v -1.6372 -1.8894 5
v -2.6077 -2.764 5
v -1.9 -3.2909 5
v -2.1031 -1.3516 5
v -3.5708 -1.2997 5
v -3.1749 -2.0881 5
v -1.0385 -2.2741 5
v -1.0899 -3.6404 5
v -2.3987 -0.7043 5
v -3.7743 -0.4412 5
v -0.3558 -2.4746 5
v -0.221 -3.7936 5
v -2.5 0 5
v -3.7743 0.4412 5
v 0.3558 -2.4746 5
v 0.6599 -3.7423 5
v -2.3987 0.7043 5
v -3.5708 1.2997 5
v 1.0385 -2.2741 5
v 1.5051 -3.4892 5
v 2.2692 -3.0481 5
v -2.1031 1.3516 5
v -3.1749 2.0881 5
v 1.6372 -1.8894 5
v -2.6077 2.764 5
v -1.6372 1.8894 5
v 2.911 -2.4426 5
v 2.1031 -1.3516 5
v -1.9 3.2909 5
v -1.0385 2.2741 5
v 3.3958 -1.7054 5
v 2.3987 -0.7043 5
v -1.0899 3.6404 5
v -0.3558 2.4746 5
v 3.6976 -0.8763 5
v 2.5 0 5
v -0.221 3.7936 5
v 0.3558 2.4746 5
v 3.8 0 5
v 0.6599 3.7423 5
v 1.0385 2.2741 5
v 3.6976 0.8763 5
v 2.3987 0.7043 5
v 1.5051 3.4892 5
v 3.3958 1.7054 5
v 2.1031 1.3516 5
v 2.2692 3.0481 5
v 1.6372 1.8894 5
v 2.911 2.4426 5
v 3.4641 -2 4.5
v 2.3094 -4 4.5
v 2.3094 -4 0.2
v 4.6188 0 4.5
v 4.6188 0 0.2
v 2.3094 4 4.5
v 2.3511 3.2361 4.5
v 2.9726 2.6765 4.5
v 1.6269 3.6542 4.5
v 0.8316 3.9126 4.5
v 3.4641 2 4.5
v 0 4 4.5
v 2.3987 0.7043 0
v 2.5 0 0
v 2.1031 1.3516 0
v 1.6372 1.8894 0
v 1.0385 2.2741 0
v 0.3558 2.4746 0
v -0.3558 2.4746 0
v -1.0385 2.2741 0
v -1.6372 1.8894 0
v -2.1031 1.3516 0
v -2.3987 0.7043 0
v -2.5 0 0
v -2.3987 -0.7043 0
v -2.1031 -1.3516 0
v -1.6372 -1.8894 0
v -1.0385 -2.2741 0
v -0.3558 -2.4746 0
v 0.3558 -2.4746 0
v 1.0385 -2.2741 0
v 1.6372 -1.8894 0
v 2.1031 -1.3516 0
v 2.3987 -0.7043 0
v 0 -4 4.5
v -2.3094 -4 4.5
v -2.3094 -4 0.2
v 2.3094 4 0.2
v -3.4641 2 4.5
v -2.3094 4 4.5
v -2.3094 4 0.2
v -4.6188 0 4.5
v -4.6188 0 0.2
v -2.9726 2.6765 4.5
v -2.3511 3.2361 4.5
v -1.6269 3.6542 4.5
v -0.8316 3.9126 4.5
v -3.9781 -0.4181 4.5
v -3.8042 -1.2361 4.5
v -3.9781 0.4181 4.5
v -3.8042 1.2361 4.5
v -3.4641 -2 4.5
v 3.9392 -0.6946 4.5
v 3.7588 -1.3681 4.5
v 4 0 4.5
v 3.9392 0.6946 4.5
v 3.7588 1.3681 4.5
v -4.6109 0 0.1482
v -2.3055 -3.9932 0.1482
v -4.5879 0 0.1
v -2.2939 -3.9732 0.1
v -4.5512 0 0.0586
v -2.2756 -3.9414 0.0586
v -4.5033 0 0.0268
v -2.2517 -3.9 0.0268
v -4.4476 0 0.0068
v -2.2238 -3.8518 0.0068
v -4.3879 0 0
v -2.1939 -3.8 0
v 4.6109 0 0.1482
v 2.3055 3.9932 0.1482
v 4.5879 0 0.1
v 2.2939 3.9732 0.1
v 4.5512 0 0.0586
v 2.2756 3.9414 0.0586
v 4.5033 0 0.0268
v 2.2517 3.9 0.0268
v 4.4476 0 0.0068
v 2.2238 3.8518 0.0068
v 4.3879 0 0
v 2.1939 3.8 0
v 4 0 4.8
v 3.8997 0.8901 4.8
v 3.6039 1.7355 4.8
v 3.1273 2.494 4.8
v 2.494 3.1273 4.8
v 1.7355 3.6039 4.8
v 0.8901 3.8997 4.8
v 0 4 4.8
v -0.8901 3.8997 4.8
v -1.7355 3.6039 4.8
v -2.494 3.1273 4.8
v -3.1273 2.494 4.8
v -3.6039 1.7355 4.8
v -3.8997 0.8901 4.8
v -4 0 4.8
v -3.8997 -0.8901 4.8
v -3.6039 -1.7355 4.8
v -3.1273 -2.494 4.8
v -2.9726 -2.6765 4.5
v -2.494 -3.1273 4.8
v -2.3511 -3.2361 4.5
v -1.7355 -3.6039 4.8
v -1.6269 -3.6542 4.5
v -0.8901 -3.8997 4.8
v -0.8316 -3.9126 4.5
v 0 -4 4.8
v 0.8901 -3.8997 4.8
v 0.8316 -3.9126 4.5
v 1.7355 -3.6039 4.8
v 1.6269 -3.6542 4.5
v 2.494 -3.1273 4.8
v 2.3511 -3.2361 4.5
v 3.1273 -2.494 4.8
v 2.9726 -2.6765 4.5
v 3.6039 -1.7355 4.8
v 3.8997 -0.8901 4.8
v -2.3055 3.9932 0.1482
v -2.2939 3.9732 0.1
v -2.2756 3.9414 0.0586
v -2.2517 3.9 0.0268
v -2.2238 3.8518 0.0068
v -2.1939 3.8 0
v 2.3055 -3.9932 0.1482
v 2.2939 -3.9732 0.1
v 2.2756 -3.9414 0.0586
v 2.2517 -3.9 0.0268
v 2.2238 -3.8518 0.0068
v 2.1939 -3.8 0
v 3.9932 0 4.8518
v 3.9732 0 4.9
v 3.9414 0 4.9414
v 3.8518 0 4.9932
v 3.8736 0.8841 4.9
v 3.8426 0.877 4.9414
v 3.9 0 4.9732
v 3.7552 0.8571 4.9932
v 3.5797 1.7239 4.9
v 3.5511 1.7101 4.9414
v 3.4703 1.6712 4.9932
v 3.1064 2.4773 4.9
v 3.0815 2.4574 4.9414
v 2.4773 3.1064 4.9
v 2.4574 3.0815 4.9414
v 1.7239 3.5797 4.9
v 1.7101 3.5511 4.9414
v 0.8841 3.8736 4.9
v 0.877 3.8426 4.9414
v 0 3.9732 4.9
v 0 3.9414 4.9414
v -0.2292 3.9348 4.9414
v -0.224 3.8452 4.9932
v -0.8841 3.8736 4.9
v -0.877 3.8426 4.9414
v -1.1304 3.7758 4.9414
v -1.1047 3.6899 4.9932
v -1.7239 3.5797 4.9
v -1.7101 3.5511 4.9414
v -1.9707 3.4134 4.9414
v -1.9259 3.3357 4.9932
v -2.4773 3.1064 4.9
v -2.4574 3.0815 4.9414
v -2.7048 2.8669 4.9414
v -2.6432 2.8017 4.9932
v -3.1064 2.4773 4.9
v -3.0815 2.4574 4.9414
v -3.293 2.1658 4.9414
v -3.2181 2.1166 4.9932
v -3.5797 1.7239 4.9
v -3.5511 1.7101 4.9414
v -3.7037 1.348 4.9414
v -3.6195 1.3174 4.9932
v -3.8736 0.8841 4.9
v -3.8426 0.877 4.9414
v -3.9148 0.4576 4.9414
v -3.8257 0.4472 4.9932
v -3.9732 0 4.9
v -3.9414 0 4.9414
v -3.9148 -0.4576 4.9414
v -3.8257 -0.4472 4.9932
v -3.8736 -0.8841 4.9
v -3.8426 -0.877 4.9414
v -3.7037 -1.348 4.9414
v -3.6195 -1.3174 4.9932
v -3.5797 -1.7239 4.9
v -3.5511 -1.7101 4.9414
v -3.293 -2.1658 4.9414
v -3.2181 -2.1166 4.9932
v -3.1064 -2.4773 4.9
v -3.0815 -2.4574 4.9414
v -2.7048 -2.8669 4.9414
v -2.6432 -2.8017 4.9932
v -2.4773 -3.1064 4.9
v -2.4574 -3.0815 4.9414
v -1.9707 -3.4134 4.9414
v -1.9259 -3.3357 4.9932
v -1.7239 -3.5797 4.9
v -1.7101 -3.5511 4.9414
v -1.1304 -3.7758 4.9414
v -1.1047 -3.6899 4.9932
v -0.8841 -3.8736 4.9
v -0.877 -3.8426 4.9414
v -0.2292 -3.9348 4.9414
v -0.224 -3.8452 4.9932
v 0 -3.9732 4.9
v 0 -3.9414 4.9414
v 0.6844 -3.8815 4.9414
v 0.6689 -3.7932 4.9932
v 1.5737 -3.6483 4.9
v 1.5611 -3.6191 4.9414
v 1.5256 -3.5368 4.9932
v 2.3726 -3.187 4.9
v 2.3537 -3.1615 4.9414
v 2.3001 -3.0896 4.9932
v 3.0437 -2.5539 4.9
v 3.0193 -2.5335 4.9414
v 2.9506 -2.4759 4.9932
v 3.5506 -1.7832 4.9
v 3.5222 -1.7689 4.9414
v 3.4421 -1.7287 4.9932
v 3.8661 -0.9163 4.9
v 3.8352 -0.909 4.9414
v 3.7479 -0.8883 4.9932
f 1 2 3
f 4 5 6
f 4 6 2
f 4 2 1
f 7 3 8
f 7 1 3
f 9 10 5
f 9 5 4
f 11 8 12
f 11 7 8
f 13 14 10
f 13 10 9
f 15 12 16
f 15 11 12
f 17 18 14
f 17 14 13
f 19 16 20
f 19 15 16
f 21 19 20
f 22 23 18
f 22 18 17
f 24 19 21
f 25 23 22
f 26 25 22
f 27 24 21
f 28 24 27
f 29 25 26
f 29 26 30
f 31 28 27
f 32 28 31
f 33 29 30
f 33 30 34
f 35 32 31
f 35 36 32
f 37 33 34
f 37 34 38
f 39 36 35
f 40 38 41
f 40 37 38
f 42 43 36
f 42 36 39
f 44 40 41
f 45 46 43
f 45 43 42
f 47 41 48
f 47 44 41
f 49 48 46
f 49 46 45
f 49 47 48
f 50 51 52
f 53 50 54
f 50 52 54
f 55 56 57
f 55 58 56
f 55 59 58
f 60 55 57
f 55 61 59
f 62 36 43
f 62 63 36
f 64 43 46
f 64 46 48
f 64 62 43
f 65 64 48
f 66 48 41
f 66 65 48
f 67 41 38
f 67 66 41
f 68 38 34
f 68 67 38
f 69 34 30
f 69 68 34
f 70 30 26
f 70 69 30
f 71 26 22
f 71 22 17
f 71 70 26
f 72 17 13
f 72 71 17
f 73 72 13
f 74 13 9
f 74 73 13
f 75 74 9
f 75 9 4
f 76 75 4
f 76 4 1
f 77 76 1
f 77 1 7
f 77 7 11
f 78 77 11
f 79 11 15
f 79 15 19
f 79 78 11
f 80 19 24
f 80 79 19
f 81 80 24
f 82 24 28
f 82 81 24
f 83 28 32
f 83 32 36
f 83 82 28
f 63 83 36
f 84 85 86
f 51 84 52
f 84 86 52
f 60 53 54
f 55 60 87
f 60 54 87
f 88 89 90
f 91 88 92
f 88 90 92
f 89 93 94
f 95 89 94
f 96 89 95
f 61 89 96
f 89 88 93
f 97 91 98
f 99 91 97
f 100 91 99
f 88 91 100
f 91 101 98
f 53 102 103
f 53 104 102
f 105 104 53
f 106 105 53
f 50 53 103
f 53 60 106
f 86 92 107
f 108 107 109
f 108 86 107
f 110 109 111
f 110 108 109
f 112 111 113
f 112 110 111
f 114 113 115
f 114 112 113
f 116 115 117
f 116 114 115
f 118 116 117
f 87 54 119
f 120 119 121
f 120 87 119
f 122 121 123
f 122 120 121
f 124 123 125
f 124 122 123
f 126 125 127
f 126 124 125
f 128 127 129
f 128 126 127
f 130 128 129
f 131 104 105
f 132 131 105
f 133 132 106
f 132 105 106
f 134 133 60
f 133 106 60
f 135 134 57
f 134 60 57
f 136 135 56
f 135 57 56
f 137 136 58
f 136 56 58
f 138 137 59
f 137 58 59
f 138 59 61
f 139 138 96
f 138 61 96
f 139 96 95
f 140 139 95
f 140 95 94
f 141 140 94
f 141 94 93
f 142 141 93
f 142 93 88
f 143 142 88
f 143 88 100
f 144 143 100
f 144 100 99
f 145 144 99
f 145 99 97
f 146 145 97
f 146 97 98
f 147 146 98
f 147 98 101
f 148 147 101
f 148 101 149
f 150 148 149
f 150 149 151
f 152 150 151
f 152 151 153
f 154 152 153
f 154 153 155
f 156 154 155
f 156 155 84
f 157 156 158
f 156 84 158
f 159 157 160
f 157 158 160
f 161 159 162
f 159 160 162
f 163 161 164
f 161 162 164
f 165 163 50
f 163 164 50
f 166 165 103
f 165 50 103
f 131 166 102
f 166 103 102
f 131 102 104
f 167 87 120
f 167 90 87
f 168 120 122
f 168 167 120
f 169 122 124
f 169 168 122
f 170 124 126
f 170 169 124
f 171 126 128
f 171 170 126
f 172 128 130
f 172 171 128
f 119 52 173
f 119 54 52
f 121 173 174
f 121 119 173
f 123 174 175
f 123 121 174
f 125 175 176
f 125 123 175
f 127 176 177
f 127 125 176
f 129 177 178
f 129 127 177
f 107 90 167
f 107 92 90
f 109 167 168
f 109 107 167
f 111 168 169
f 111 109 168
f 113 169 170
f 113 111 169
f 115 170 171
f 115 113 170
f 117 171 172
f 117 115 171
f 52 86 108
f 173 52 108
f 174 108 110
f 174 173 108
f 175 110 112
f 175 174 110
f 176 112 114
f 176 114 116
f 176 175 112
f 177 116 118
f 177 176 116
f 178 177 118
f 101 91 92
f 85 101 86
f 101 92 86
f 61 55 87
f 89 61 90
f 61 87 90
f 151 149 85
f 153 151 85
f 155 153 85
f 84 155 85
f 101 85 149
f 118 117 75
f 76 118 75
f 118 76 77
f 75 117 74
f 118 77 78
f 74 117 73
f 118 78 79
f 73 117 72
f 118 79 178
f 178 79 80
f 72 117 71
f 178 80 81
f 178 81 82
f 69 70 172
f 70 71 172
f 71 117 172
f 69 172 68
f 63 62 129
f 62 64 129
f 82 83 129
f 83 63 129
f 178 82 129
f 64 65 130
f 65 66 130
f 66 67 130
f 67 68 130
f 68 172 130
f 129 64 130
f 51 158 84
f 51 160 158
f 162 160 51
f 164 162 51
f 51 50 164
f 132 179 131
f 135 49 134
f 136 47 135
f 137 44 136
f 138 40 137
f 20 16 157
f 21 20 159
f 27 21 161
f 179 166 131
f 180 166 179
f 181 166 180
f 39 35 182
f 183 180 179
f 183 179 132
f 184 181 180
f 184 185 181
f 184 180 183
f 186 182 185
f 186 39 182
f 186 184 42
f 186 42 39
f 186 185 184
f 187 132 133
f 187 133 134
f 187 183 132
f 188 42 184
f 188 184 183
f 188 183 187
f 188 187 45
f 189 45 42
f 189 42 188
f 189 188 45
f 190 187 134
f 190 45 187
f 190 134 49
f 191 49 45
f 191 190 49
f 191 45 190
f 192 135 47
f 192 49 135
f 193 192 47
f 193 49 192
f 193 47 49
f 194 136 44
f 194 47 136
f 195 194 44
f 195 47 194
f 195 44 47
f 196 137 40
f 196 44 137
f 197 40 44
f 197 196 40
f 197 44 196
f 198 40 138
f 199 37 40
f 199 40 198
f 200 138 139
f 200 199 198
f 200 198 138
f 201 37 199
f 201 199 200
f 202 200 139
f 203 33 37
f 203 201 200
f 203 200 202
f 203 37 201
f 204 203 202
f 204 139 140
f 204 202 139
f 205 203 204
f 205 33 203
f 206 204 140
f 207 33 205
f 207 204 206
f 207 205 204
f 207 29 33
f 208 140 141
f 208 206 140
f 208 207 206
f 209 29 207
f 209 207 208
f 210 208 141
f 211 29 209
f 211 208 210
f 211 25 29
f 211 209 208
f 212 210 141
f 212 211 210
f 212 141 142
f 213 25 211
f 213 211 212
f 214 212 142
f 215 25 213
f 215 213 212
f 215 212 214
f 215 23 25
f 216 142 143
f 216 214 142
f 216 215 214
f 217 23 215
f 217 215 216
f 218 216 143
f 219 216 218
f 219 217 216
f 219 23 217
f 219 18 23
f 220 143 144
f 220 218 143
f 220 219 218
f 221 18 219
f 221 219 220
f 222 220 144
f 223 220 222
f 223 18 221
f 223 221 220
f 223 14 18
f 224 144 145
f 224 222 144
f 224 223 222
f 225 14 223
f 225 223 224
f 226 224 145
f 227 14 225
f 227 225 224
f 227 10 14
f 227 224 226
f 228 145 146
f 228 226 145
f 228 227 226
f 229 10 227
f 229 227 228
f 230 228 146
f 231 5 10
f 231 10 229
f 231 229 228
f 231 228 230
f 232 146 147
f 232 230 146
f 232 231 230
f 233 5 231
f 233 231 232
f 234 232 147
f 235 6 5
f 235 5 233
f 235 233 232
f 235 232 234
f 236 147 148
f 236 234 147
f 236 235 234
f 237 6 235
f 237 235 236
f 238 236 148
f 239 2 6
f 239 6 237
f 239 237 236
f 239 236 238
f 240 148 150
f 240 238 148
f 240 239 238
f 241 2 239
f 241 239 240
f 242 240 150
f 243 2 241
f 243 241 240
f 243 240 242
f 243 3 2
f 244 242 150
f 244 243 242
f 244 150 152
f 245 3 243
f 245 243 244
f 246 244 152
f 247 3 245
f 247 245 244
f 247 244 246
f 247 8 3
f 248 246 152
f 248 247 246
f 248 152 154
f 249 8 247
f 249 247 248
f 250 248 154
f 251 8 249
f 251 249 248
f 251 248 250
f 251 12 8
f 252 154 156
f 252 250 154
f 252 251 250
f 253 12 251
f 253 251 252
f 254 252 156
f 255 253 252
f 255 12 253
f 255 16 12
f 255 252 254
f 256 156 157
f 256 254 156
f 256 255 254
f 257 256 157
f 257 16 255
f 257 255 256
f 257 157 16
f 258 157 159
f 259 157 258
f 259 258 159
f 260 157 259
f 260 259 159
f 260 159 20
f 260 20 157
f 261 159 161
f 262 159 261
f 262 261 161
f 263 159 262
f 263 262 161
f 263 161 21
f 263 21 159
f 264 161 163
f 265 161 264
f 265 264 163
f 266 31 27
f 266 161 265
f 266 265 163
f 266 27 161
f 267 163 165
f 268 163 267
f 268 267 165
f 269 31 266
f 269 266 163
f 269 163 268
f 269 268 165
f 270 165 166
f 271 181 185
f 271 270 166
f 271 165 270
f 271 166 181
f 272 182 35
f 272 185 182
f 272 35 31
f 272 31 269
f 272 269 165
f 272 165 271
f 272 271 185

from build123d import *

# Parameters (mm, degrees)
SKETCH_1_R      = 2.5
EXTRUDE_1_DEPTH = 4.5
SKETCH_2_R      = 4
SKETCH_2_R_2    = 2.5
EXTRUDE_2_DEPTH = 0.5
FILLET_1_R      = 0.2
FILLET_2_R      = 0.2


with BuildPart() as part:
    # 草图1 → 凸台-拉伸1 (new body)
    with BuildSketch(Plane.XY):
        Polygon((4.618802154, 0), (2.309401077, 4), (-2.309401077, 4), (-4.618802154, 0), (-2.309401077, -4), (2.309401077, -4), align=None)
        Circle(SKETCH_1_R, mode=Mode.SUBTRACT)
    extrude(amount=EXTRUDE_1_DEPTH)

    # 草图2 → 凸台-拉伸2 (add)
    with BuildSketch(Plane.XY.offset(4.5)):
        Circle(SKETCH_2_R)
        Circle(SKETCH_2_R_2, mode=Mode.SUBTRACT)
    extrude(amount=EXTRUDE_2_DEPTH)

    # 圆角1
    fillet_1_edges = [part.edges().sort_by_distance(p)[0] for p in [
        (-4, 0, 5),
    ]]
    fillet(fillet_1_edges, radius=FILLET_1_R)

    # 圆角2
    fillet_2_edges = [part.edges().sort_by_distance(p)[0] for p in [
        (0, -4, 0),
        (-3.464101615, -2, 0),
        (-3.464101615, 2, 0),
        (0, 4, 0),
        (3.464101615, 2, 0),
        (3.464101615, -2, 0),
    ]]
    fillet(fillet_2_edges, radius=FILLET_2_R)


solid = part.part
